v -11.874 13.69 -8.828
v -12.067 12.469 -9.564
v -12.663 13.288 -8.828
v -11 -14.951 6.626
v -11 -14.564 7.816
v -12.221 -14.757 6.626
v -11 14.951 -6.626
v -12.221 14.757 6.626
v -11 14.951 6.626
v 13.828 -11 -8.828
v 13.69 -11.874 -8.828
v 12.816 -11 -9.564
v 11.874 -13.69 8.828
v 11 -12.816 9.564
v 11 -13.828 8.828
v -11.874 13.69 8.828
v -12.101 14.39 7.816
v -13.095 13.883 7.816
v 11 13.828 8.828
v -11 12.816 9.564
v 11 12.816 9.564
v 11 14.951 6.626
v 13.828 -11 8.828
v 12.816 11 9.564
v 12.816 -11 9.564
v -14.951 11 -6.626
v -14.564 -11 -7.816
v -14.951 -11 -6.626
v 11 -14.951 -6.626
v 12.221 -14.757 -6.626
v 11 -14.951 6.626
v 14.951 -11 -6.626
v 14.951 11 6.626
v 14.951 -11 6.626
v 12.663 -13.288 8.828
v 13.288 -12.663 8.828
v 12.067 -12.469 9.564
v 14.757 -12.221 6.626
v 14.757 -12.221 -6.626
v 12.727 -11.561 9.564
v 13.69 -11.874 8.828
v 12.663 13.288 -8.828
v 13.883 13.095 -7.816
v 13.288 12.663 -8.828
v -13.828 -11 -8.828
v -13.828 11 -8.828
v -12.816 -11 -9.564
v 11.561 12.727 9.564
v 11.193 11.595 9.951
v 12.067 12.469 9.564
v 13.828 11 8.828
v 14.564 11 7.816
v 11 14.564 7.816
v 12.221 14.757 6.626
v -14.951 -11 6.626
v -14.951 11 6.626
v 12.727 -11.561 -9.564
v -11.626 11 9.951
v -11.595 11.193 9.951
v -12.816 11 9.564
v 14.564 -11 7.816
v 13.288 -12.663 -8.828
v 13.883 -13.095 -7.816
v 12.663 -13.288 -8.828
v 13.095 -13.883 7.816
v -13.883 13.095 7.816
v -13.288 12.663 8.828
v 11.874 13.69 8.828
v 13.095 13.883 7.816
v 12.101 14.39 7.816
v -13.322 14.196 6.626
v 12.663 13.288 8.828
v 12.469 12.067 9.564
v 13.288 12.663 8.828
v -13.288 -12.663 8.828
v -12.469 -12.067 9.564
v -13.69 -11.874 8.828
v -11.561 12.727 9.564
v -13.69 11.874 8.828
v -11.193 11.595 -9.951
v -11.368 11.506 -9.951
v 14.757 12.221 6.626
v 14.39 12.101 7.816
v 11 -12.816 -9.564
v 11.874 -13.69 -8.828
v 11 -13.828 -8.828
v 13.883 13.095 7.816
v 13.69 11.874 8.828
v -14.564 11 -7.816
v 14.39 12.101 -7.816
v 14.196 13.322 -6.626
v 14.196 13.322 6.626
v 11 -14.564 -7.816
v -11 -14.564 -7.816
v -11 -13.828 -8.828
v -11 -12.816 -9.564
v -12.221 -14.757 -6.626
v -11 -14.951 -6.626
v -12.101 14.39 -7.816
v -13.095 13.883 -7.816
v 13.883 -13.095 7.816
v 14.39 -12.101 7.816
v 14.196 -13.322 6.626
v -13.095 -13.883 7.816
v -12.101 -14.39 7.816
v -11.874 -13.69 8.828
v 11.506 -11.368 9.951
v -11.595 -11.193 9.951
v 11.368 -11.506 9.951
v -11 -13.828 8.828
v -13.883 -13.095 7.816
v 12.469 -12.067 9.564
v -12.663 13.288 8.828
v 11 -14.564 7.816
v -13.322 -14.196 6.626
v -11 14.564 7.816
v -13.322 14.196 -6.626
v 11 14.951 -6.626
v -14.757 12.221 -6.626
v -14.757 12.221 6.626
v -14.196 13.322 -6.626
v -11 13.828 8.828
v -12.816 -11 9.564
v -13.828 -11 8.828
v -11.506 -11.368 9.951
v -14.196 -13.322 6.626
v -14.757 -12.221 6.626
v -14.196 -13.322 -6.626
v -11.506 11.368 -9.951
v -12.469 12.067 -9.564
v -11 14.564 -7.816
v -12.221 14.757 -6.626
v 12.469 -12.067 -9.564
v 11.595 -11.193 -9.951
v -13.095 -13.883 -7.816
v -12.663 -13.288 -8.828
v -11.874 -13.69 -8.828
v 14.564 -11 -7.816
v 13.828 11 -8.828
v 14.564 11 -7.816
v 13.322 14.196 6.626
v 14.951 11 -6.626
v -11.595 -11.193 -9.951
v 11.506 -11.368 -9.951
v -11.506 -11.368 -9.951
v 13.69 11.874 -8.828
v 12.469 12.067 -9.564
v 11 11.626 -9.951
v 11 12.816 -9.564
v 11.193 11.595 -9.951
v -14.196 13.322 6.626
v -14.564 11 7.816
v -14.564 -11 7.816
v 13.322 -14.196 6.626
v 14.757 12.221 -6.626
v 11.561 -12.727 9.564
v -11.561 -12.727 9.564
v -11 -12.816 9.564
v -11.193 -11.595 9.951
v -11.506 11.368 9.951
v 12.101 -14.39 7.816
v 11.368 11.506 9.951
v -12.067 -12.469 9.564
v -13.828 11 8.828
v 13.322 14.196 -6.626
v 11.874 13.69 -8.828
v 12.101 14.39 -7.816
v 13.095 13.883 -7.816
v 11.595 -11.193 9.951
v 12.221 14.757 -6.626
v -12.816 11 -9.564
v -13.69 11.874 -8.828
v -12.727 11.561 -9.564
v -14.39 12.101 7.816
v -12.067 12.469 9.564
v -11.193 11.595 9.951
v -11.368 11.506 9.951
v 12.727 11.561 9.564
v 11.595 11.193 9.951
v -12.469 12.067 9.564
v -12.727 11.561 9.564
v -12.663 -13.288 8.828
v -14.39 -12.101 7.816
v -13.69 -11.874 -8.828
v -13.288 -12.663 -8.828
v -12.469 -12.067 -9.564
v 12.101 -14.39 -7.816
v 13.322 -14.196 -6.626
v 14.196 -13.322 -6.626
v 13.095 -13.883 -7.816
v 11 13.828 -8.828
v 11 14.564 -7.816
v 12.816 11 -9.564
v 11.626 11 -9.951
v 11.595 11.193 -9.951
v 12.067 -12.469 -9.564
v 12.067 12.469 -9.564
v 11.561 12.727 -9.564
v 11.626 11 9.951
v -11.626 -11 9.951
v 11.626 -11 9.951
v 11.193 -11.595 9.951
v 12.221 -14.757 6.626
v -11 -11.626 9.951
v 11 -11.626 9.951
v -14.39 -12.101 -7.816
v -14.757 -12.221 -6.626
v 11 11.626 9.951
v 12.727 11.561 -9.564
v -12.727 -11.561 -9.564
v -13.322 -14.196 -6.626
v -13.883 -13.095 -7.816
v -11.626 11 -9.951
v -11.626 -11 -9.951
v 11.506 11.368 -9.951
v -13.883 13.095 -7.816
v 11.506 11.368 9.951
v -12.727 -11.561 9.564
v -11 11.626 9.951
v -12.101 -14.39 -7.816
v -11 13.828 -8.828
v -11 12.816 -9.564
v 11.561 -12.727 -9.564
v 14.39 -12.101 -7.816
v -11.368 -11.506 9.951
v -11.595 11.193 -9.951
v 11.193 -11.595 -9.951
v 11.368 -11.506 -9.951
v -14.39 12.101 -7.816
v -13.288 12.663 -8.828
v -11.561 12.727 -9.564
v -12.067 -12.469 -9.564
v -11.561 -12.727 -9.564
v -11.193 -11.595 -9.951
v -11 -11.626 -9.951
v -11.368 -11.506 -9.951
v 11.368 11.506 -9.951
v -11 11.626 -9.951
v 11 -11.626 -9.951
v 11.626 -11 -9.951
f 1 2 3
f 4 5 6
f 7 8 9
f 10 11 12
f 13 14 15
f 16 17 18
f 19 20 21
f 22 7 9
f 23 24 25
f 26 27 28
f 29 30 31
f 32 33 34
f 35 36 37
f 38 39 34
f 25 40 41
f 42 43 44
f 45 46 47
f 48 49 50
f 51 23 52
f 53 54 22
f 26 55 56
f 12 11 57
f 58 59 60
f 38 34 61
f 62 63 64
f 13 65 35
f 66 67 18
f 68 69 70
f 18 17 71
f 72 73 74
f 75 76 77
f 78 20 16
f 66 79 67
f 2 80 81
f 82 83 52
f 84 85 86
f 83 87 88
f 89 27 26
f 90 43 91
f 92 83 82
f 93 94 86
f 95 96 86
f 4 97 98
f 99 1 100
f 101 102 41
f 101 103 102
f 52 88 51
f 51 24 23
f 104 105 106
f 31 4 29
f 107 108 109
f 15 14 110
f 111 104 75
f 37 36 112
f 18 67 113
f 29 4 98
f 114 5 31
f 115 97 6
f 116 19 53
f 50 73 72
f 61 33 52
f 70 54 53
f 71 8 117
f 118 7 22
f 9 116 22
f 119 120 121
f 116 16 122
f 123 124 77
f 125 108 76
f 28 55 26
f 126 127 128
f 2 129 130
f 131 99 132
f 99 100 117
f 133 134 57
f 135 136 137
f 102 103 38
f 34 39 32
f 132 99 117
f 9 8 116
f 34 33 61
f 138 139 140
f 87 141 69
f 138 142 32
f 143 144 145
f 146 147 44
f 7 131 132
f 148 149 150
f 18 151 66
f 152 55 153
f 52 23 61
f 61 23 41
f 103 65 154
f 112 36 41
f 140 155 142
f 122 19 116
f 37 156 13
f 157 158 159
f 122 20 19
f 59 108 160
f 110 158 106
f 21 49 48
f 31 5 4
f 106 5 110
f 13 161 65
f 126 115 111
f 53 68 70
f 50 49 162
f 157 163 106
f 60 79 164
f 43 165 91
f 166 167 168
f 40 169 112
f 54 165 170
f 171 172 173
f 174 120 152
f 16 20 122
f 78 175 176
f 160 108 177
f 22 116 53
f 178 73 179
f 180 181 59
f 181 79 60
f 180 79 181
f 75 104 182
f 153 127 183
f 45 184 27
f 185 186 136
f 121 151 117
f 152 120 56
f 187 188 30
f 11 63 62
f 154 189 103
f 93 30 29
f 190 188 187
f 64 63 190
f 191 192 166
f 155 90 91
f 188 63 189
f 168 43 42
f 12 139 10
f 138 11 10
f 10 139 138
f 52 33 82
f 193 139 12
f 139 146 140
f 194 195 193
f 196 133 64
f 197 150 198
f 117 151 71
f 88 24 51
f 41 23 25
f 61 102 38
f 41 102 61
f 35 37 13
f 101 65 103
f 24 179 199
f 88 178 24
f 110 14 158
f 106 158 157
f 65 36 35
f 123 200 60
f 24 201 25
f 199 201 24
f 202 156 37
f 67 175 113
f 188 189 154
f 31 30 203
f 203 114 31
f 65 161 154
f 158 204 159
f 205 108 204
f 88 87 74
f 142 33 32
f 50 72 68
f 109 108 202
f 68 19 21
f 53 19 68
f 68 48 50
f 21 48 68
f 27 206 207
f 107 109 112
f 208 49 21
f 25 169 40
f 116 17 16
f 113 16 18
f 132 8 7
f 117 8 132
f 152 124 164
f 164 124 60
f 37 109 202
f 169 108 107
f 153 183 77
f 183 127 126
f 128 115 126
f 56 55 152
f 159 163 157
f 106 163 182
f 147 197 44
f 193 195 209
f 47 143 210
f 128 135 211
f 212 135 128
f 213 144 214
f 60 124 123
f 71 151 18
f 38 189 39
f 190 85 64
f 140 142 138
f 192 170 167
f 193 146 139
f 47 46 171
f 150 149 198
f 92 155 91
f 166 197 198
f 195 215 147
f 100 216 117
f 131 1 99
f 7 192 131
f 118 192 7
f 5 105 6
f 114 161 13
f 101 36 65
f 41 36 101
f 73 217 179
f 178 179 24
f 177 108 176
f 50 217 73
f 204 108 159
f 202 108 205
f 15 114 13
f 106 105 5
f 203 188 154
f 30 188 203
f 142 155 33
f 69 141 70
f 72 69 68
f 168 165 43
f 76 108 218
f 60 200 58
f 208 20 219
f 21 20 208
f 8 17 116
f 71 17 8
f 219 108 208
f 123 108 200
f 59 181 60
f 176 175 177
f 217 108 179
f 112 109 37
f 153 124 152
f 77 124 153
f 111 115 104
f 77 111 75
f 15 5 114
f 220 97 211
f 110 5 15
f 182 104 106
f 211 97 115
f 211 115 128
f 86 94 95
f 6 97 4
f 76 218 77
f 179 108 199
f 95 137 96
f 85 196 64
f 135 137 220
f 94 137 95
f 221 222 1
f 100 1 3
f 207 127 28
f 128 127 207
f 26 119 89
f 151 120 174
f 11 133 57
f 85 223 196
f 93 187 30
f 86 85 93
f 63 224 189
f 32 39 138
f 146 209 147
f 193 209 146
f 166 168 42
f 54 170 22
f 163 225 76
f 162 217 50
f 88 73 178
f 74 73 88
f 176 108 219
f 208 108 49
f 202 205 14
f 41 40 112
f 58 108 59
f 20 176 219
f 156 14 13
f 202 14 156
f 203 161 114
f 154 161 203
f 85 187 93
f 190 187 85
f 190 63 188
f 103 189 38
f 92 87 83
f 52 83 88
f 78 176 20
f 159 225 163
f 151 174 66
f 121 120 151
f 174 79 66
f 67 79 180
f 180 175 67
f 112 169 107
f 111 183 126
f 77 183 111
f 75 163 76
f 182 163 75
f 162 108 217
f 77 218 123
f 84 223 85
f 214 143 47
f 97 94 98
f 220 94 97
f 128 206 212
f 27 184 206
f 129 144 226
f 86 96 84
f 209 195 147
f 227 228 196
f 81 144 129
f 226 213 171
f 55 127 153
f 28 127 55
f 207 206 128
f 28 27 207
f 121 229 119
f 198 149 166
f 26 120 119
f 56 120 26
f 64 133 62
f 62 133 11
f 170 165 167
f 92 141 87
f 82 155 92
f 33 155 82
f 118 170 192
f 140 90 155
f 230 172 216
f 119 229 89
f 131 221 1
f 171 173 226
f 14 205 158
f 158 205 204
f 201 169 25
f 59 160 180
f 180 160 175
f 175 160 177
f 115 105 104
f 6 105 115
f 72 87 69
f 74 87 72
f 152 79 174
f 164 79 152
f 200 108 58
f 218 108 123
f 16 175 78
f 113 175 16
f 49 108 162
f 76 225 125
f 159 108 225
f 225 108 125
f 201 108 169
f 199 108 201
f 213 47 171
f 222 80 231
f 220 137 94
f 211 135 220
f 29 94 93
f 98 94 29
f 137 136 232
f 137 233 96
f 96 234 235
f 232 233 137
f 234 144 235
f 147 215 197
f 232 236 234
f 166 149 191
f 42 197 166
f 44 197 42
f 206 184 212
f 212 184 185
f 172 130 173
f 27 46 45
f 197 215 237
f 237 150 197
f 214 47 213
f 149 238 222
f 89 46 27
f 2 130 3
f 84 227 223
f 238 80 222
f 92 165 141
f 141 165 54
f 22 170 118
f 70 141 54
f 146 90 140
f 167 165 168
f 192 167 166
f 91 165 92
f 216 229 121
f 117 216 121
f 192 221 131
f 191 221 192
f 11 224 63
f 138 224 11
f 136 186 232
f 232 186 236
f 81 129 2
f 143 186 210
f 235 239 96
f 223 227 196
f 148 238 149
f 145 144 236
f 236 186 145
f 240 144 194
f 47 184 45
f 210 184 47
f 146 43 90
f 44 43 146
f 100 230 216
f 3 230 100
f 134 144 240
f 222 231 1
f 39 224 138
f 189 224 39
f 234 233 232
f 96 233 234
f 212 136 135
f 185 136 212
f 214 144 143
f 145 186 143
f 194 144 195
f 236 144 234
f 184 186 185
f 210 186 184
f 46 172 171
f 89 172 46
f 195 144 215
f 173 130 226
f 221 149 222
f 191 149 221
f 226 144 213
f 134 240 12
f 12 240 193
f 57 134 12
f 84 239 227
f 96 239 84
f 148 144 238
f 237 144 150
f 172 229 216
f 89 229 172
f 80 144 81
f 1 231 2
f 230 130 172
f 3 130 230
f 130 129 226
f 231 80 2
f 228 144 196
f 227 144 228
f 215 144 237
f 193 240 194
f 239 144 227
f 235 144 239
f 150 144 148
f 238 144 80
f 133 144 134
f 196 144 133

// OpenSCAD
X=0;
Y=1;
Z=2;

r= 4;
A= [30,30,20];

a= (A- [2*r,2*r,2*r])/2;

x=a[X];
y=a[Y];
z=a[Z];

vertice=[
    [x,y,z],
    [-x,y,z],
    [-x,-y,z],
    [x,-y,z],
    [x,y,-z],
    [-x,y,-z],
    [-x,-y,-z],
    [x,-y,-z],
];

%cube(A, center=true);

hull(){
    for(pos=vertice)
        translate(pos)
            sphere(r=r, $fn=20);
}
